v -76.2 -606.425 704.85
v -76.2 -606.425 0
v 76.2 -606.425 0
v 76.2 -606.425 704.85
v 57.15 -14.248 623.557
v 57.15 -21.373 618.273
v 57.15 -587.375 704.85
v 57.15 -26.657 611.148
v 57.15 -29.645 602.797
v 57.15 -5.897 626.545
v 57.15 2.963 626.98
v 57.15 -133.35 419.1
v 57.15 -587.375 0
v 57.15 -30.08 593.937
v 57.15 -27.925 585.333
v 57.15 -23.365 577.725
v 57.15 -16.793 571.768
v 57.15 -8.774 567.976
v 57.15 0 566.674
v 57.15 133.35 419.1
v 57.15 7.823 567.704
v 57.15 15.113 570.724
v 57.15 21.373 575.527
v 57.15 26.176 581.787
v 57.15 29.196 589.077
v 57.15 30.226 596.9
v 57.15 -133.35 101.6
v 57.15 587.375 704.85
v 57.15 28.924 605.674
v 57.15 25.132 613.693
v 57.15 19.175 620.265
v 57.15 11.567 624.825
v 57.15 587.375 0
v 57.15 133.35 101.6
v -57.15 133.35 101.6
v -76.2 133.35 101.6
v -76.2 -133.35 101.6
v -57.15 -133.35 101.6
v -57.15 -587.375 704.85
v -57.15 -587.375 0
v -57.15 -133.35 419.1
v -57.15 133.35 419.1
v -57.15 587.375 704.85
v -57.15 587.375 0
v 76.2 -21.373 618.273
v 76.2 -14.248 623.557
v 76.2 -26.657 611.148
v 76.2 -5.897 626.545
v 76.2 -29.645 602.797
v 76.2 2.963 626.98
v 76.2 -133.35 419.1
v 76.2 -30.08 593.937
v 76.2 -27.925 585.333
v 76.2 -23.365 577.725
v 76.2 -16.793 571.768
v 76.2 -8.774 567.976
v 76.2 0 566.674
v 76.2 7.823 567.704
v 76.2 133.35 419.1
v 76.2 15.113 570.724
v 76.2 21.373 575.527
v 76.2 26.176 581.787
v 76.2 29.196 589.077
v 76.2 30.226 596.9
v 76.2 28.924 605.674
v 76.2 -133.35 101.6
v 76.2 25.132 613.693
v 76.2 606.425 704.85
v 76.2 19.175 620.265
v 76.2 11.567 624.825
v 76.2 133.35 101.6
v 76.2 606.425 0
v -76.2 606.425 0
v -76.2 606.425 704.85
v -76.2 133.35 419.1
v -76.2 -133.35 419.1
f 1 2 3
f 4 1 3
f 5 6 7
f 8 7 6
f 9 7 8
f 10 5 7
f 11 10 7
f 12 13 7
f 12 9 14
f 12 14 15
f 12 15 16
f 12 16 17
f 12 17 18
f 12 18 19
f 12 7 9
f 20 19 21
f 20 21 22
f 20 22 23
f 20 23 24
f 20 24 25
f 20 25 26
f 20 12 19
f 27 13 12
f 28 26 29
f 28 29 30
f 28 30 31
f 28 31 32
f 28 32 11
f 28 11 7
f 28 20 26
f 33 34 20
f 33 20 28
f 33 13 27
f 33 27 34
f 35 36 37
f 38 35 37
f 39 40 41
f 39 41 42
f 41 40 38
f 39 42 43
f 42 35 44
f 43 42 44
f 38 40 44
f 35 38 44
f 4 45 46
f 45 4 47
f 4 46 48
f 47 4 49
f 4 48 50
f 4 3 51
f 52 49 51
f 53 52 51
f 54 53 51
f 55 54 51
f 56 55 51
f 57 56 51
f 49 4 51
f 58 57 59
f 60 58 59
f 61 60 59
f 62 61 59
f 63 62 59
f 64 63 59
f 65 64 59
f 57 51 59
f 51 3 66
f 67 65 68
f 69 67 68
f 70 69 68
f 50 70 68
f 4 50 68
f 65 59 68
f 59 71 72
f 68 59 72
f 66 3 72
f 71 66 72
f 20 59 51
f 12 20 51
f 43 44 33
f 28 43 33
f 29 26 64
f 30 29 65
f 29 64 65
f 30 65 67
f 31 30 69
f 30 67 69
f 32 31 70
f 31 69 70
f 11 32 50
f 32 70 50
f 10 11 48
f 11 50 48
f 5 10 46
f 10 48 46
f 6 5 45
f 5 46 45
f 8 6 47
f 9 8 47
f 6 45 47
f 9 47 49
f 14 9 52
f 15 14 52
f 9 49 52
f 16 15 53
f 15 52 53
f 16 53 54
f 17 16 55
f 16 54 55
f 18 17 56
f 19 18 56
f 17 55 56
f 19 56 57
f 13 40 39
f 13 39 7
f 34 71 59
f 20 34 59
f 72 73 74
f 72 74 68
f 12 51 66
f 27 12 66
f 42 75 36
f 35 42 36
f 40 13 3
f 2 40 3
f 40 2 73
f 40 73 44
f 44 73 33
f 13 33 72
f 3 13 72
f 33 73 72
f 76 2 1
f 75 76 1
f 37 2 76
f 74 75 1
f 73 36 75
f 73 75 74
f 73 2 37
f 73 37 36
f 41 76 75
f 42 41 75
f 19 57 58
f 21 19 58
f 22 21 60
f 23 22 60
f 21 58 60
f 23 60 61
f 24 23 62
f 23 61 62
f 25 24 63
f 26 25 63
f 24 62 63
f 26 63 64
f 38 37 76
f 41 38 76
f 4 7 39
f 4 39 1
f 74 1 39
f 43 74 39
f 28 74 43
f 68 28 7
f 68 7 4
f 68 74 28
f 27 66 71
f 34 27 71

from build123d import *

# Parameters (mm, degrees)
F0_W     = 152.4
F0_H     = 1212.85
F0_W_2   = 114.3
F0_H_2   = 1174.75
F1_DEPTH = 704.85
F3_DEPTH = 25.4
F5_DEPTH = 19.05


# Not quite as in the source:
# - a feature names something its author has since deleted; it is built from what else it names


with BuildPart() as f1:
    # F0 (on Top) → F1 (new body)
    with BuildSketch(Plane.XY):
        Rectangle(F0_W, F0_H)
        Rectangle(F0_W_2, F0_H_2, mode=Mode.SUBTRACT)
    extrude(amount=F1_DEPTH)

    # F2 (on face) → F3 (cut)
    with BuildSketch(Plane.YZ.offset(76.2)):
        with BuildLine():
            ThreePointArc((30.226, 596.9), (-21.3730095681, 618.2730095681), (0, 566.674))
            ThreePointArc((0, 566.674), (21.3730095681, 575.5269904319), (30.226, 596.9))
        make_face()
        Polygon((-133.35, 101.6), (0, 101.6), (133.35, 101.6), (133.35, 419.1), (0, 419.1), (-133.35, 419.1), align=None)
    extrude(amount=-F3_DEPTH, mode=Mode.SUBTRACT)

    # F4 (on face) → F5 (cut)
    with BuildSketch(Plane(origin=(-76.2, 0, 0), x_dir=(0, -1, 0), z_dir=(-1, 0, 0))):
        Polygon((-133.35, 101.6), (0, 101.6), (133.35, 101.6), (133.35, 419.1), (-133.35, 419.1), align=None)
    extrude(amount=-F5_DEPTH, mode=Mode.SUBTRACT)


solid = f1.part
